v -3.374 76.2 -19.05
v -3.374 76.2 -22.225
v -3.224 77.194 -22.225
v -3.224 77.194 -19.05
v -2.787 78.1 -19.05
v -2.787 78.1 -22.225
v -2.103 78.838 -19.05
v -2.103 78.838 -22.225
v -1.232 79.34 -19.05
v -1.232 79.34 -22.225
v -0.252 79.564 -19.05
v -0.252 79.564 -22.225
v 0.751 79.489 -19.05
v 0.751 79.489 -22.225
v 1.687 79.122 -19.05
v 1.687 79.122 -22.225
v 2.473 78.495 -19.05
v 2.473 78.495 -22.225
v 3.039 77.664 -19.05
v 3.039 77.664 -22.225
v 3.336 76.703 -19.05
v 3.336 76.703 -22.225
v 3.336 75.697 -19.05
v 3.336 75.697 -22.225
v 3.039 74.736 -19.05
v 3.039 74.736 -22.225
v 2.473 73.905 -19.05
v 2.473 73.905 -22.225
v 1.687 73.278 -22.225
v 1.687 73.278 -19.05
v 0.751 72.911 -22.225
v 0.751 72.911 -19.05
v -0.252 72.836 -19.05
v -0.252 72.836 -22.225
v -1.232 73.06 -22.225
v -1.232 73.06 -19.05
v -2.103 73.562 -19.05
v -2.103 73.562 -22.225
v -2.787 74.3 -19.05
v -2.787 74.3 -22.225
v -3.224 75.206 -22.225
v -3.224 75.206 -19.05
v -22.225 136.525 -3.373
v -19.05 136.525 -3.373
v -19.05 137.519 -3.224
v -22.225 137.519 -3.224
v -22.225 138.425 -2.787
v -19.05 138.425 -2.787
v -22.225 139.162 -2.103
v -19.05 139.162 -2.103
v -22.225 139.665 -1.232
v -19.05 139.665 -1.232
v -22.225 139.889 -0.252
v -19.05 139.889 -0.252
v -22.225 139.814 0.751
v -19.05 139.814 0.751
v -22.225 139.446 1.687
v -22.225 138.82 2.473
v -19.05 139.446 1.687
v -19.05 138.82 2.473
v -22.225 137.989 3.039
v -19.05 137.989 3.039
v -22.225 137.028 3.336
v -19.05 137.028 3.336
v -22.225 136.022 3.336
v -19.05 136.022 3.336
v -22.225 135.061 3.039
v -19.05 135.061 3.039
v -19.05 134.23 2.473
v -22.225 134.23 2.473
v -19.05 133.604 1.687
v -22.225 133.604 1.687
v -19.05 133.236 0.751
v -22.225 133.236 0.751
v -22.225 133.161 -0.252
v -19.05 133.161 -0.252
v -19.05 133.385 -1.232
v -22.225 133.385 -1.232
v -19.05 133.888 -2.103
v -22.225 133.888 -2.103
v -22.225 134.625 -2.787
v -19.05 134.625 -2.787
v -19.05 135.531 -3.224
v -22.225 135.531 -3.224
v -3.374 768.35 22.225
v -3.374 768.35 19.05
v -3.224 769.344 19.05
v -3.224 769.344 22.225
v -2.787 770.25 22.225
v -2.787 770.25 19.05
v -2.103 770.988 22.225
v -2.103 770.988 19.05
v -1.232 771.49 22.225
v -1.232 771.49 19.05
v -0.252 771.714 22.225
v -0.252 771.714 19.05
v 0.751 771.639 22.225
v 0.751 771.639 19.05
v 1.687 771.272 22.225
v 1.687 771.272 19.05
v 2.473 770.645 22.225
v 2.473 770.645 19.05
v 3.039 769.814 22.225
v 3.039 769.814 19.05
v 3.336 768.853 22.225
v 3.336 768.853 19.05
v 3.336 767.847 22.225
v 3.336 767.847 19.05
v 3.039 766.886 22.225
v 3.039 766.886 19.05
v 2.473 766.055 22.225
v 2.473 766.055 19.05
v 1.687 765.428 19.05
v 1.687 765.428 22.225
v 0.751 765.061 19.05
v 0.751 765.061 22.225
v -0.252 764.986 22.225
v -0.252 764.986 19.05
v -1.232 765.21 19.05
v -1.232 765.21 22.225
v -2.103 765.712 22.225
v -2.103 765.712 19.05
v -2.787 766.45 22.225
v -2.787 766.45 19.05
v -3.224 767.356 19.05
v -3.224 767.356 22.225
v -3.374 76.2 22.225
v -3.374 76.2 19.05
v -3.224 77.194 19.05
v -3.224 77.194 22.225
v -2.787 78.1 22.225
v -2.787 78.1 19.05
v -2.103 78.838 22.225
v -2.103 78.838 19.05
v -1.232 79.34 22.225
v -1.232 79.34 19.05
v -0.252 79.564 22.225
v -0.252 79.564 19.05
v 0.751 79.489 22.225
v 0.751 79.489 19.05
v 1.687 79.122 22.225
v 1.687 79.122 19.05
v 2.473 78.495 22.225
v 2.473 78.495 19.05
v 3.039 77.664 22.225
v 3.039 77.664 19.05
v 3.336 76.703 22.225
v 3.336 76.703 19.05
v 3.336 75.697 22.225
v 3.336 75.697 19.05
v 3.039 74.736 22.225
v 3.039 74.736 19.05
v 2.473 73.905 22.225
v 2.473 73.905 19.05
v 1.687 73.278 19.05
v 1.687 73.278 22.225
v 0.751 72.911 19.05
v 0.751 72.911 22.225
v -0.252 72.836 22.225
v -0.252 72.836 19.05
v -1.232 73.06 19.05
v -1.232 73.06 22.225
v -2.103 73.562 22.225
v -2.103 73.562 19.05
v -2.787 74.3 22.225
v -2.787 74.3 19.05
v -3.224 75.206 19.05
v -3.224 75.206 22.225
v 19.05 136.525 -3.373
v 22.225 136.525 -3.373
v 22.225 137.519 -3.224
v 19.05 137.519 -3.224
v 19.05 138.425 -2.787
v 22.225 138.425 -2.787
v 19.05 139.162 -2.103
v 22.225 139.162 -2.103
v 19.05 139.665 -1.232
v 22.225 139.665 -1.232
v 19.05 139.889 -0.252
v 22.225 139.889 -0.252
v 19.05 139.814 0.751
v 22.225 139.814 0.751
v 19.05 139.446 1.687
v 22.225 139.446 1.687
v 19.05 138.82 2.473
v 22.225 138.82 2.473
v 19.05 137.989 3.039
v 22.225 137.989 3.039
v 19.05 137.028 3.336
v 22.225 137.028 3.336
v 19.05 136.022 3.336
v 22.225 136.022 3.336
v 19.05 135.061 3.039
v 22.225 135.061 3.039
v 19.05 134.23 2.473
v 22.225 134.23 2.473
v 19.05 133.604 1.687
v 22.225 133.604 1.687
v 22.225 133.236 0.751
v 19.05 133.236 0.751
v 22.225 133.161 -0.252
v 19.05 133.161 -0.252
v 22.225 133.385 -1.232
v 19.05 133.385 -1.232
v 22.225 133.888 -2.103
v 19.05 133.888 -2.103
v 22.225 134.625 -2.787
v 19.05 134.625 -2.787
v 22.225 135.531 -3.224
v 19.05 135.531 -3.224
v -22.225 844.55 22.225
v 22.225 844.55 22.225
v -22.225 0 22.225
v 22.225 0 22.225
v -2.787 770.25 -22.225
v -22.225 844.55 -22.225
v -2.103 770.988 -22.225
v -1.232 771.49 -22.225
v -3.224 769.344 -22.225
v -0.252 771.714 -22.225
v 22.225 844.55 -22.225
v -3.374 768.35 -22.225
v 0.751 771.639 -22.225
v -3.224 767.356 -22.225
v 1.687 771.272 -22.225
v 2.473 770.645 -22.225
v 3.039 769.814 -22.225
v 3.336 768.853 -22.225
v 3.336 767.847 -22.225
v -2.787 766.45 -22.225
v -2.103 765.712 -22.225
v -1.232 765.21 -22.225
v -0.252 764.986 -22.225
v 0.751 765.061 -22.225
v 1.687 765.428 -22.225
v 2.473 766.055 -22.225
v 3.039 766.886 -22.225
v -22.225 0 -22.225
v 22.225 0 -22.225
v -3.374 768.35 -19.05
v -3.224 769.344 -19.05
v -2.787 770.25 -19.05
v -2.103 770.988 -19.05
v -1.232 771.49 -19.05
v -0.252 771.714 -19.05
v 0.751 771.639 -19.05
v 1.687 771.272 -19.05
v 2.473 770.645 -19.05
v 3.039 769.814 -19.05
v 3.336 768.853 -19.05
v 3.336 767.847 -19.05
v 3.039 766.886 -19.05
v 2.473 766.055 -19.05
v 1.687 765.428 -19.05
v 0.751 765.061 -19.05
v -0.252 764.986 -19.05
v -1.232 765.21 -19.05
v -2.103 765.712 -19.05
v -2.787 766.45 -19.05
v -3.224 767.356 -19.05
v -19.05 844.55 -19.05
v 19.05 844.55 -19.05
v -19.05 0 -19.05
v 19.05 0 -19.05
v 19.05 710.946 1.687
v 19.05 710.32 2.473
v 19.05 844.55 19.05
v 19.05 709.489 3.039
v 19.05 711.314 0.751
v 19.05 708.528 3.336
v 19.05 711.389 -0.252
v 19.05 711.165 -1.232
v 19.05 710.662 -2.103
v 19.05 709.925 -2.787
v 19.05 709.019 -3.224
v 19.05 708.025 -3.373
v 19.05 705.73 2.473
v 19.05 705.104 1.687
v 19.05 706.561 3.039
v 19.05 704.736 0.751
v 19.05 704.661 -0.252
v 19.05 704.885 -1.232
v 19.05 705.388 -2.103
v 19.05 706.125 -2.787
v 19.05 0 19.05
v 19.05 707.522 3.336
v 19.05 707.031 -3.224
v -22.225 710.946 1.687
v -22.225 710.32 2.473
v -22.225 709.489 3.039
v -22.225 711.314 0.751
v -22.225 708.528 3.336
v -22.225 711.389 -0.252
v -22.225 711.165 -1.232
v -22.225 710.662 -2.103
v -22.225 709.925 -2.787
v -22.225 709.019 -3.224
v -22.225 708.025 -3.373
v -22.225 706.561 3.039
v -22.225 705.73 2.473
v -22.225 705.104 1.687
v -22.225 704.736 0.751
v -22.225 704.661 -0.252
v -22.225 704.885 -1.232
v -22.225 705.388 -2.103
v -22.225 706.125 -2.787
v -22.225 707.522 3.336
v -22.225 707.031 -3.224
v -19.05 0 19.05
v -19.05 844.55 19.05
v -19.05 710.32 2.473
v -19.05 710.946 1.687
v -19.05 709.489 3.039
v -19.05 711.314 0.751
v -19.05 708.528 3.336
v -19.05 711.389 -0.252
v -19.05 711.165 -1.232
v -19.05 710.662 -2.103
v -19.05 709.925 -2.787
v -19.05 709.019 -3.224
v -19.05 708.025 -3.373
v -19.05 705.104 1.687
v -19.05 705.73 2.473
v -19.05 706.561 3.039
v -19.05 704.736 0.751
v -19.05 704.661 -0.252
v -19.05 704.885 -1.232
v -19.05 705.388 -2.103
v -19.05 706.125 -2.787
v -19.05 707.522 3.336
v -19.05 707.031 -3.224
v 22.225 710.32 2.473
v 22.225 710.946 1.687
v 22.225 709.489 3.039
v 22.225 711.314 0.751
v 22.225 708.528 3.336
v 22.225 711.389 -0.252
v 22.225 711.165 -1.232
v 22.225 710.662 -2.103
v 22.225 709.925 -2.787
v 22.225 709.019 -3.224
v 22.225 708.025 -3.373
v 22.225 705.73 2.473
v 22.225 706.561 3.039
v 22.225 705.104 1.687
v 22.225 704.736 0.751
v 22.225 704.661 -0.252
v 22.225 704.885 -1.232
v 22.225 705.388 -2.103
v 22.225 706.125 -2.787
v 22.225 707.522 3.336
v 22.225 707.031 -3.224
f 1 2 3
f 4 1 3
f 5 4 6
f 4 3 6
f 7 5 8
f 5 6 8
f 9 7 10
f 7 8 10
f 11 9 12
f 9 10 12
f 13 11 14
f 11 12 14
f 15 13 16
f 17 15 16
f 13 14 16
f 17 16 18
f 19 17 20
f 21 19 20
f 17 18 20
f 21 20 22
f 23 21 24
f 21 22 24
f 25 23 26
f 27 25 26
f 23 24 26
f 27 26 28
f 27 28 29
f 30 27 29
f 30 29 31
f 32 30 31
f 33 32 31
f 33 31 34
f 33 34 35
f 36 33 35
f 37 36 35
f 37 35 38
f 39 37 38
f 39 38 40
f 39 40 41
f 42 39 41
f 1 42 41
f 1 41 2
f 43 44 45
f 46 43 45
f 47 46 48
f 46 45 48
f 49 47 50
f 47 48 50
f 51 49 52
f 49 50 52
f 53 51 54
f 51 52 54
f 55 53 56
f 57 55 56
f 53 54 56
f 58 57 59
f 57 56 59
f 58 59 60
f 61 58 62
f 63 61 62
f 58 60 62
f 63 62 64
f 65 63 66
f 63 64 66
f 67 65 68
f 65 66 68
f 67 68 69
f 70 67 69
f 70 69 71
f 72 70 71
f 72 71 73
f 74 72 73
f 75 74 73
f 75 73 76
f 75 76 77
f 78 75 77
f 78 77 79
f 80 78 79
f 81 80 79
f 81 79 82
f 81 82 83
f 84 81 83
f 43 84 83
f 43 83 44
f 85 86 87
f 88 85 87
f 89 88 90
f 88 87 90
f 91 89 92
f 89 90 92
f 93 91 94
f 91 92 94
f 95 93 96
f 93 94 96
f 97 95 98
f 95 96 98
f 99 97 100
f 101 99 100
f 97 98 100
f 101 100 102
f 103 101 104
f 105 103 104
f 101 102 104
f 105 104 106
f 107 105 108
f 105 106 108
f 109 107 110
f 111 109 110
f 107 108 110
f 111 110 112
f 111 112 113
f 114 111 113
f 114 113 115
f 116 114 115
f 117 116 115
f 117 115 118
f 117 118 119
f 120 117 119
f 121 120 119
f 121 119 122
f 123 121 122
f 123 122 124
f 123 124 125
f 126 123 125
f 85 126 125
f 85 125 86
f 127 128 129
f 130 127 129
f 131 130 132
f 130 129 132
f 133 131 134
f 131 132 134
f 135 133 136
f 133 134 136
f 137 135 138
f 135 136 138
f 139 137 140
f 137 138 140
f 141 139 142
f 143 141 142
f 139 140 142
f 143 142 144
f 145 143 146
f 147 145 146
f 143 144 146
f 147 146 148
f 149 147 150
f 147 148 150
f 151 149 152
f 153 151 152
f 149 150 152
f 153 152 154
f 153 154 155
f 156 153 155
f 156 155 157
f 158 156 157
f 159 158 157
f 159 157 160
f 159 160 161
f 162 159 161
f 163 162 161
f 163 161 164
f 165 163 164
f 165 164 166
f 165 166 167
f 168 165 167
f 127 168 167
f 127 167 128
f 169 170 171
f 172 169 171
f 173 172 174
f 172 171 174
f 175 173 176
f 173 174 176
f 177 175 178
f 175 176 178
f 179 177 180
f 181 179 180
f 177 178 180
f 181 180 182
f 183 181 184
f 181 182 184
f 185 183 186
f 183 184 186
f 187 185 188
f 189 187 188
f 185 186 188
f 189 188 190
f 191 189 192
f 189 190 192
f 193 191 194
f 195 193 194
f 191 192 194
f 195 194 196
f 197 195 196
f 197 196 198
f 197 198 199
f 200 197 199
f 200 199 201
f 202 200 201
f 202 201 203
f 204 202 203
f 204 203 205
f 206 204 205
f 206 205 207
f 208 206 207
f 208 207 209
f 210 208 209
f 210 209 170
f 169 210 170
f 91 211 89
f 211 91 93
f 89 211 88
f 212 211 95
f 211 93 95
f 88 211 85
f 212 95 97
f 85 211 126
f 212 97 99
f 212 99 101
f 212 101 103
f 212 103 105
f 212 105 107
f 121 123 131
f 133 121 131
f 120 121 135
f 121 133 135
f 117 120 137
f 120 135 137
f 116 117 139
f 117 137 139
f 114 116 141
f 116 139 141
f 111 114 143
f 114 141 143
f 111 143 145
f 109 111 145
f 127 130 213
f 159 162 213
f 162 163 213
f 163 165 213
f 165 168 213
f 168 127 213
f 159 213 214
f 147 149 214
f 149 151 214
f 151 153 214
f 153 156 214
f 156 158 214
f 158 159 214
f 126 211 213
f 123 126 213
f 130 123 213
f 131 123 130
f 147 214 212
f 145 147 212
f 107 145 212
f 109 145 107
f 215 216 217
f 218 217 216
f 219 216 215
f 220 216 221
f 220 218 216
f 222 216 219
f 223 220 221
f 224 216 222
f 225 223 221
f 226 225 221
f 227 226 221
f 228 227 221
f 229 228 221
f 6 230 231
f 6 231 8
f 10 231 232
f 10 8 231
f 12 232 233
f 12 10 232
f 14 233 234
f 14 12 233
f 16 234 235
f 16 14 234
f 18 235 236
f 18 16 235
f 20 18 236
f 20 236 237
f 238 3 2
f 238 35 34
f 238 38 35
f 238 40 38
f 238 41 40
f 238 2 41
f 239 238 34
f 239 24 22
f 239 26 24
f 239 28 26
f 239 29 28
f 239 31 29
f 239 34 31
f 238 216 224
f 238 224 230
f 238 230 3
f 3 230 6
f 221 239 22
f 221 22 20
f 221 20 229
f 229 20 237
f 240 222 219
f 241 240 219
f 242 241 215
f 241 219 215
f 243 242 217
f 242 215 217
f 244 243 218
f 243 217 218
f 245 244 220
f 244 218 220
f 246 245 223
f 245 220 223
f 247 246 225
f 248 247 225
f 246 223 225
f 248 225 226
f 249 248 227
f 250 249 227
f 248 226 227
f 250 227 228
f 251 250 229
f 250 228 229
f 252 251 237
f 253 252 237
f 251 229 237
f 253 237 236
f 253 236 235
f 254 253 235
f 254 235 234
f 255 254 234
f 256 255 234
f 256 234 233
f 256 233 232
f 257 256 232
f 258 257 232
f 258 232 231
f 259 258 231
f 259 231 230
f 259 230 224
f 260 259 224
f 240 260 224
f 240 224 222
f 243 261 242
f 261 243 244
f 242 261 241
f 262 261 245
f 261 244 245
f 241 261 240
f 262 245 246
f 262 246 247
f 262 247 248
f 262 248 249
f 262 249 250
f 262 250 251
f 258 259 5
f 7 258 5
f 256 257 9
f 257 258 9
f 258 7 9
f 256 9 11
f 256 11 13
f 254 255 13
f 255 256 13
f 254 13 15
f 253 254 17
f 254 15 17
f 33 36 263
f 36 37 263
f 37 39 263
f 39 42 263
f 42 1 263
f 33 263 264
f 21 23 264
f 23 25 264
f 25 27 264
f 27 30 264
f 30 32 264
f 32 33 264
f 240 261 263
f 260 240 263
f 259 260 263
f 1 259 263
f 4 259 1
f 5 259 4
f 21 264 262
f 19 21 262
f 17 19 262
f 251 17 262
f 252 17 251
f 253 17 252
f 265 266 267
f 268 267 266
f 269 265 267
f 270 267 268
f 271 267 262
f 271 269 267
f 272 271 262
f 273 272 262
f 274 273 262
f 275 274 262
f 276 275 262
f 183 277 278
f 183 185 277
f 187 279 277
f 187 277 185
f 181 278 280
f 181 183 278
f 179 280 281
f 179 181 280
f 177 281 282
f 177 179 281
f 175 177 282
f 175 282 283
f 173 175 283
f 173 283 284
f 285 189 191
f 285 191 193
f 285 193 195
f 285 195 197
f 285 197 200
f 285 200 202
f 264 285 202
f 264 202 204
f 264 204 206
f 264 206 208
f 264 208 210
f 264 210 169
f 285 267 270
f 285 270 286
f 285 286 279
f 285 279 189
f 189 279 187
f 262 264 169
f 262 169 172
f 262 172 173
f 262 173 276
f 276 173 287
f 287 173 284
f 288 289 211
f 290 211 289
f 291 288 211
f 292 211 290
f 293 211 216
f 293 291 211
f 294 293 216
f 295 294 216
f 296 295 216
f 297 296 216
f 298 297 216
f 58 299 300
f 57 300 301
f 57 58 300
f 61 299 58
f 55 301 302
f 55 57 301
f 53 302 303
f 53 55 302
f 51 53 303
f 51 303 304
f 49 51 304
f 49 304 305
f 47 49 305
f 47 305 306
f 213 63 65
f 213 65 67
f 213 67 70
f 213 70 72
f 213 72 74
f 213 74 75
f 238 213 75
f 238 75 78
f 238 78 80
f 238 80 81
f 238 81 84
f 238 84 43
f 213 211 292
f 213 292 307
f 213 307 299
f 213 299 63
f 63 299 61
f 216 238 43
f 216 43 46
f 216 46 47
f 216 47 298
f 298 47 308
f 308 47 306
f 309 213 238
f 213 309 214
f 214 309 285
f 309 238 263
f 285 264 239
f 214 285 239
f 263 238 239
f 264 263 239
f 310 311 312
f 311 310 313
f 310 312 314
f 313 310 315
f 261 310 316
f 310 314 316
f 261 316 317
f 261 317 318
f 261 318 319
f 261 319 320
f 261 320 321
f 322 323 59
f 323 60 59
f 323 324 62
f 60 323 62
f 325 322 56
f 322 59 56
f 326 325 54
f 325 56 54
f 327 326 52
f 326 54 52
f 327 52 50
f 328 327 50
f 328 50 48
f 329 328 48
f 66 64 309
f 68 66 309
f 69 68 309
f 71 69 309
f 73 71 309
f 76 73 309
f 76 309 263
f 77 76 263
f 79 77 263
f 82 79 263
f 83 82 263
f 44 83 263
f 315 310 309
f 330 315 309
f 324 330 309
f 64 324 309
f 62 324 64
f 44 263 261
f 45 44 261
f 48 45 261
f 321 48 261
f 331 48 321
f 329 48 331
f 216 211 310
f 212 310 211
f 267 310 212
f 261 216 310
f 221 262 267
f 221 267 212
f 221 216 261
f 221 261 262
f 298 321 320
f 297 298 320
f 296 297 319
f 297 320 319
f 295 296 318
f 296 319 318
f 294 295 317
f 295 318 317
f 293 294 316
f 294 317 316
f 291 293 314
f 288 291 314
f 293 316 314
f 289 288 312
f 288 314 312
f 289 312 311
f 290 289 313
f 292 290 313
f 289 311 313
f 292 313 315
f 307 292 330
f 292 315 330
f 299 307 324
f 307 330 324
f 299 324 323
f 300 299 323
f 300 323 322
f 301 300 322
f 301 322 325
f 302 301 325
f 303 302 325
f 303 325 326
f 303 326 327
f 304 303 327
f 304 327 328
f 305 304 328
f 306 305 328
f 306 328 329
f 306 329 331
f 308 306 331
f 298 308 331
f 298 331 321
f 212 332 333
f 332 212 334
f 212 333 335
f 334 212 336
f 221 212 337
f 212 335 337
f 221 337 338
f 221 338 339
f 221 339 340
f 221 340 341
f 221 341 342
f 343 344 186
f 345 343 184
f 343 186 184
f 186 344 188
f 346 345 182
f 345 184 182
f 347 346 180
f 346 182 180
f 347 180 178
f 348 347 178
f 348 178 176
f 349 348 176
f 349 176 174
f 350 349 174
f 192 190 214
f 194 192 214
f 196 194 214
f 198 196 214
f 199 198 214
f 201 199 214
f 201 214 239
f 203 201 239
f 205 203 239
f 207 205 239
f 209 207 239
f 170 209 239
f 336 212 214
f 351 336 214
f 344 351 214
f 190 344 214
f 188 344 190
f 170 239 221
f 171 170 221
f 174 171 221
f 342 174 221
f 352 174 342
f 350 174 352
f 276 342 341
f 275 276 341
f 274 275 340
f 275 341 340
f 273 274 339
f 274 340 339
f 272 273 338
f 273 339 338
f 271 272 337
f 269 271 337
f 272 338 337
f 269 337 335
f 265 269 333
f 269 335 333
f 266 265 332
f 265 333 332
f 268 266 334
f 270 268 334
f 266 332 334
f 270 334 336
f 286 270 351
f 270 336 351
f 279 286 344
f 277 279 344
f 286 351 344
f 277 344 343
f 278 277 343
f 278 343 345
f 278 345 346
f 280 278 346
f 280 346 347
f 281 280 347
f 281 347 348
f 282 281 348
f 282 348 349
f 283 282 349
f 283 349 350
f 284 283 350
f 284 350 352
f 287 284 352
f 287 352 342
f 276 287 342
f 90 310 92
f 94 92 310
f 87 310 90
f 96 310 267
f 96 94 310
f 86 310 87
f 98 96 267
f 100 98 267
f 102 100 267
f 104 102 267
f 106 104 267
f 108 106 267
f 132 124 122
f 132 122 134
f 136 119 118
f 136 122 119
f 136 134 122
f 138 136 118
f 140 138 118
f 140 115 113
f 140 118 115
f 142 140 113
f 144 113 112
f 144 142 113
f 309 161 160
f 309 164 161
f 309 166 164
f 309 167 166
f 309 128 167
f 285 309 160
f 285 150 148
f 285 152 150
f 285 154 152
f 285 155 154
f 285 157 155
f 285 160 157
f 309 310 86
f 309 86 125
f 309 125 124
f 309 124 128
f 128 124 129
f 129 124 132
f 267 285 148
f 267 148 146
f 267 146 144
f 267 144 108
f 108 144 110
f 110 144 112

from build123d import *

# Parameters (mm, degrees)
SKETCH1_W                        = 44.45
SKETCH1_H                        = 44.45
SKETCH1_W_2                      = 38.1
SKETCH1_H_2                      = 38.1
BOSS_EXTRUDE1_DEPTH              = 844.55
F_17_64_0_26563_DIAMETER_HOLE1_D = 6.747002
SKETCH6_R                        = 3.3734375
CUT_EXTRUDE1_DEPTH               = 847.010907509


with BuildPart() as part:
    # Sketch1 → Boss-Extrude1 (new body)
    with BuildSketch(Plane(origin=(0, 0, 0), x_dir=(1, 0, 0), z_dir=(0, 1, 0))):
        Rectangle(SKETCH1_W, SKETCH1_H)
        Rectangle(SKETCH1_W_2, SKETCH1_H_2, mode=Mode.SUBTRACT)
    extrude(amount=BOSS_EXTRUDE1_DEPTH)

    # 17/64 (0.26563) Diameter Hole1 (through all)
    with Locations(Plane.XY.offset(22.225)):
        with Locations((0, 768.35), (0, 76.2)):
            Hole(F_17_64_0_26563_DIAMETER_HOLE1_D / 2)

    # Sketch6 → Cut-Extrude1 (cut, through all)
    with BuildSketch(Plane(origin=(22.225, 0, 0), x_dir=(0, 0, -1), z_dir=(1, 0, 0))):
        with Locations((0, 136.525)):
            Circle(SKETCH6_R)
        with Locations((0, 708.025)):
            Circle(SKETCH6_R)
    extrude(amount=-CUT_EXTRUDE1_DEPTH, mode=Mode.SUBTRACT)


solid = part.part
